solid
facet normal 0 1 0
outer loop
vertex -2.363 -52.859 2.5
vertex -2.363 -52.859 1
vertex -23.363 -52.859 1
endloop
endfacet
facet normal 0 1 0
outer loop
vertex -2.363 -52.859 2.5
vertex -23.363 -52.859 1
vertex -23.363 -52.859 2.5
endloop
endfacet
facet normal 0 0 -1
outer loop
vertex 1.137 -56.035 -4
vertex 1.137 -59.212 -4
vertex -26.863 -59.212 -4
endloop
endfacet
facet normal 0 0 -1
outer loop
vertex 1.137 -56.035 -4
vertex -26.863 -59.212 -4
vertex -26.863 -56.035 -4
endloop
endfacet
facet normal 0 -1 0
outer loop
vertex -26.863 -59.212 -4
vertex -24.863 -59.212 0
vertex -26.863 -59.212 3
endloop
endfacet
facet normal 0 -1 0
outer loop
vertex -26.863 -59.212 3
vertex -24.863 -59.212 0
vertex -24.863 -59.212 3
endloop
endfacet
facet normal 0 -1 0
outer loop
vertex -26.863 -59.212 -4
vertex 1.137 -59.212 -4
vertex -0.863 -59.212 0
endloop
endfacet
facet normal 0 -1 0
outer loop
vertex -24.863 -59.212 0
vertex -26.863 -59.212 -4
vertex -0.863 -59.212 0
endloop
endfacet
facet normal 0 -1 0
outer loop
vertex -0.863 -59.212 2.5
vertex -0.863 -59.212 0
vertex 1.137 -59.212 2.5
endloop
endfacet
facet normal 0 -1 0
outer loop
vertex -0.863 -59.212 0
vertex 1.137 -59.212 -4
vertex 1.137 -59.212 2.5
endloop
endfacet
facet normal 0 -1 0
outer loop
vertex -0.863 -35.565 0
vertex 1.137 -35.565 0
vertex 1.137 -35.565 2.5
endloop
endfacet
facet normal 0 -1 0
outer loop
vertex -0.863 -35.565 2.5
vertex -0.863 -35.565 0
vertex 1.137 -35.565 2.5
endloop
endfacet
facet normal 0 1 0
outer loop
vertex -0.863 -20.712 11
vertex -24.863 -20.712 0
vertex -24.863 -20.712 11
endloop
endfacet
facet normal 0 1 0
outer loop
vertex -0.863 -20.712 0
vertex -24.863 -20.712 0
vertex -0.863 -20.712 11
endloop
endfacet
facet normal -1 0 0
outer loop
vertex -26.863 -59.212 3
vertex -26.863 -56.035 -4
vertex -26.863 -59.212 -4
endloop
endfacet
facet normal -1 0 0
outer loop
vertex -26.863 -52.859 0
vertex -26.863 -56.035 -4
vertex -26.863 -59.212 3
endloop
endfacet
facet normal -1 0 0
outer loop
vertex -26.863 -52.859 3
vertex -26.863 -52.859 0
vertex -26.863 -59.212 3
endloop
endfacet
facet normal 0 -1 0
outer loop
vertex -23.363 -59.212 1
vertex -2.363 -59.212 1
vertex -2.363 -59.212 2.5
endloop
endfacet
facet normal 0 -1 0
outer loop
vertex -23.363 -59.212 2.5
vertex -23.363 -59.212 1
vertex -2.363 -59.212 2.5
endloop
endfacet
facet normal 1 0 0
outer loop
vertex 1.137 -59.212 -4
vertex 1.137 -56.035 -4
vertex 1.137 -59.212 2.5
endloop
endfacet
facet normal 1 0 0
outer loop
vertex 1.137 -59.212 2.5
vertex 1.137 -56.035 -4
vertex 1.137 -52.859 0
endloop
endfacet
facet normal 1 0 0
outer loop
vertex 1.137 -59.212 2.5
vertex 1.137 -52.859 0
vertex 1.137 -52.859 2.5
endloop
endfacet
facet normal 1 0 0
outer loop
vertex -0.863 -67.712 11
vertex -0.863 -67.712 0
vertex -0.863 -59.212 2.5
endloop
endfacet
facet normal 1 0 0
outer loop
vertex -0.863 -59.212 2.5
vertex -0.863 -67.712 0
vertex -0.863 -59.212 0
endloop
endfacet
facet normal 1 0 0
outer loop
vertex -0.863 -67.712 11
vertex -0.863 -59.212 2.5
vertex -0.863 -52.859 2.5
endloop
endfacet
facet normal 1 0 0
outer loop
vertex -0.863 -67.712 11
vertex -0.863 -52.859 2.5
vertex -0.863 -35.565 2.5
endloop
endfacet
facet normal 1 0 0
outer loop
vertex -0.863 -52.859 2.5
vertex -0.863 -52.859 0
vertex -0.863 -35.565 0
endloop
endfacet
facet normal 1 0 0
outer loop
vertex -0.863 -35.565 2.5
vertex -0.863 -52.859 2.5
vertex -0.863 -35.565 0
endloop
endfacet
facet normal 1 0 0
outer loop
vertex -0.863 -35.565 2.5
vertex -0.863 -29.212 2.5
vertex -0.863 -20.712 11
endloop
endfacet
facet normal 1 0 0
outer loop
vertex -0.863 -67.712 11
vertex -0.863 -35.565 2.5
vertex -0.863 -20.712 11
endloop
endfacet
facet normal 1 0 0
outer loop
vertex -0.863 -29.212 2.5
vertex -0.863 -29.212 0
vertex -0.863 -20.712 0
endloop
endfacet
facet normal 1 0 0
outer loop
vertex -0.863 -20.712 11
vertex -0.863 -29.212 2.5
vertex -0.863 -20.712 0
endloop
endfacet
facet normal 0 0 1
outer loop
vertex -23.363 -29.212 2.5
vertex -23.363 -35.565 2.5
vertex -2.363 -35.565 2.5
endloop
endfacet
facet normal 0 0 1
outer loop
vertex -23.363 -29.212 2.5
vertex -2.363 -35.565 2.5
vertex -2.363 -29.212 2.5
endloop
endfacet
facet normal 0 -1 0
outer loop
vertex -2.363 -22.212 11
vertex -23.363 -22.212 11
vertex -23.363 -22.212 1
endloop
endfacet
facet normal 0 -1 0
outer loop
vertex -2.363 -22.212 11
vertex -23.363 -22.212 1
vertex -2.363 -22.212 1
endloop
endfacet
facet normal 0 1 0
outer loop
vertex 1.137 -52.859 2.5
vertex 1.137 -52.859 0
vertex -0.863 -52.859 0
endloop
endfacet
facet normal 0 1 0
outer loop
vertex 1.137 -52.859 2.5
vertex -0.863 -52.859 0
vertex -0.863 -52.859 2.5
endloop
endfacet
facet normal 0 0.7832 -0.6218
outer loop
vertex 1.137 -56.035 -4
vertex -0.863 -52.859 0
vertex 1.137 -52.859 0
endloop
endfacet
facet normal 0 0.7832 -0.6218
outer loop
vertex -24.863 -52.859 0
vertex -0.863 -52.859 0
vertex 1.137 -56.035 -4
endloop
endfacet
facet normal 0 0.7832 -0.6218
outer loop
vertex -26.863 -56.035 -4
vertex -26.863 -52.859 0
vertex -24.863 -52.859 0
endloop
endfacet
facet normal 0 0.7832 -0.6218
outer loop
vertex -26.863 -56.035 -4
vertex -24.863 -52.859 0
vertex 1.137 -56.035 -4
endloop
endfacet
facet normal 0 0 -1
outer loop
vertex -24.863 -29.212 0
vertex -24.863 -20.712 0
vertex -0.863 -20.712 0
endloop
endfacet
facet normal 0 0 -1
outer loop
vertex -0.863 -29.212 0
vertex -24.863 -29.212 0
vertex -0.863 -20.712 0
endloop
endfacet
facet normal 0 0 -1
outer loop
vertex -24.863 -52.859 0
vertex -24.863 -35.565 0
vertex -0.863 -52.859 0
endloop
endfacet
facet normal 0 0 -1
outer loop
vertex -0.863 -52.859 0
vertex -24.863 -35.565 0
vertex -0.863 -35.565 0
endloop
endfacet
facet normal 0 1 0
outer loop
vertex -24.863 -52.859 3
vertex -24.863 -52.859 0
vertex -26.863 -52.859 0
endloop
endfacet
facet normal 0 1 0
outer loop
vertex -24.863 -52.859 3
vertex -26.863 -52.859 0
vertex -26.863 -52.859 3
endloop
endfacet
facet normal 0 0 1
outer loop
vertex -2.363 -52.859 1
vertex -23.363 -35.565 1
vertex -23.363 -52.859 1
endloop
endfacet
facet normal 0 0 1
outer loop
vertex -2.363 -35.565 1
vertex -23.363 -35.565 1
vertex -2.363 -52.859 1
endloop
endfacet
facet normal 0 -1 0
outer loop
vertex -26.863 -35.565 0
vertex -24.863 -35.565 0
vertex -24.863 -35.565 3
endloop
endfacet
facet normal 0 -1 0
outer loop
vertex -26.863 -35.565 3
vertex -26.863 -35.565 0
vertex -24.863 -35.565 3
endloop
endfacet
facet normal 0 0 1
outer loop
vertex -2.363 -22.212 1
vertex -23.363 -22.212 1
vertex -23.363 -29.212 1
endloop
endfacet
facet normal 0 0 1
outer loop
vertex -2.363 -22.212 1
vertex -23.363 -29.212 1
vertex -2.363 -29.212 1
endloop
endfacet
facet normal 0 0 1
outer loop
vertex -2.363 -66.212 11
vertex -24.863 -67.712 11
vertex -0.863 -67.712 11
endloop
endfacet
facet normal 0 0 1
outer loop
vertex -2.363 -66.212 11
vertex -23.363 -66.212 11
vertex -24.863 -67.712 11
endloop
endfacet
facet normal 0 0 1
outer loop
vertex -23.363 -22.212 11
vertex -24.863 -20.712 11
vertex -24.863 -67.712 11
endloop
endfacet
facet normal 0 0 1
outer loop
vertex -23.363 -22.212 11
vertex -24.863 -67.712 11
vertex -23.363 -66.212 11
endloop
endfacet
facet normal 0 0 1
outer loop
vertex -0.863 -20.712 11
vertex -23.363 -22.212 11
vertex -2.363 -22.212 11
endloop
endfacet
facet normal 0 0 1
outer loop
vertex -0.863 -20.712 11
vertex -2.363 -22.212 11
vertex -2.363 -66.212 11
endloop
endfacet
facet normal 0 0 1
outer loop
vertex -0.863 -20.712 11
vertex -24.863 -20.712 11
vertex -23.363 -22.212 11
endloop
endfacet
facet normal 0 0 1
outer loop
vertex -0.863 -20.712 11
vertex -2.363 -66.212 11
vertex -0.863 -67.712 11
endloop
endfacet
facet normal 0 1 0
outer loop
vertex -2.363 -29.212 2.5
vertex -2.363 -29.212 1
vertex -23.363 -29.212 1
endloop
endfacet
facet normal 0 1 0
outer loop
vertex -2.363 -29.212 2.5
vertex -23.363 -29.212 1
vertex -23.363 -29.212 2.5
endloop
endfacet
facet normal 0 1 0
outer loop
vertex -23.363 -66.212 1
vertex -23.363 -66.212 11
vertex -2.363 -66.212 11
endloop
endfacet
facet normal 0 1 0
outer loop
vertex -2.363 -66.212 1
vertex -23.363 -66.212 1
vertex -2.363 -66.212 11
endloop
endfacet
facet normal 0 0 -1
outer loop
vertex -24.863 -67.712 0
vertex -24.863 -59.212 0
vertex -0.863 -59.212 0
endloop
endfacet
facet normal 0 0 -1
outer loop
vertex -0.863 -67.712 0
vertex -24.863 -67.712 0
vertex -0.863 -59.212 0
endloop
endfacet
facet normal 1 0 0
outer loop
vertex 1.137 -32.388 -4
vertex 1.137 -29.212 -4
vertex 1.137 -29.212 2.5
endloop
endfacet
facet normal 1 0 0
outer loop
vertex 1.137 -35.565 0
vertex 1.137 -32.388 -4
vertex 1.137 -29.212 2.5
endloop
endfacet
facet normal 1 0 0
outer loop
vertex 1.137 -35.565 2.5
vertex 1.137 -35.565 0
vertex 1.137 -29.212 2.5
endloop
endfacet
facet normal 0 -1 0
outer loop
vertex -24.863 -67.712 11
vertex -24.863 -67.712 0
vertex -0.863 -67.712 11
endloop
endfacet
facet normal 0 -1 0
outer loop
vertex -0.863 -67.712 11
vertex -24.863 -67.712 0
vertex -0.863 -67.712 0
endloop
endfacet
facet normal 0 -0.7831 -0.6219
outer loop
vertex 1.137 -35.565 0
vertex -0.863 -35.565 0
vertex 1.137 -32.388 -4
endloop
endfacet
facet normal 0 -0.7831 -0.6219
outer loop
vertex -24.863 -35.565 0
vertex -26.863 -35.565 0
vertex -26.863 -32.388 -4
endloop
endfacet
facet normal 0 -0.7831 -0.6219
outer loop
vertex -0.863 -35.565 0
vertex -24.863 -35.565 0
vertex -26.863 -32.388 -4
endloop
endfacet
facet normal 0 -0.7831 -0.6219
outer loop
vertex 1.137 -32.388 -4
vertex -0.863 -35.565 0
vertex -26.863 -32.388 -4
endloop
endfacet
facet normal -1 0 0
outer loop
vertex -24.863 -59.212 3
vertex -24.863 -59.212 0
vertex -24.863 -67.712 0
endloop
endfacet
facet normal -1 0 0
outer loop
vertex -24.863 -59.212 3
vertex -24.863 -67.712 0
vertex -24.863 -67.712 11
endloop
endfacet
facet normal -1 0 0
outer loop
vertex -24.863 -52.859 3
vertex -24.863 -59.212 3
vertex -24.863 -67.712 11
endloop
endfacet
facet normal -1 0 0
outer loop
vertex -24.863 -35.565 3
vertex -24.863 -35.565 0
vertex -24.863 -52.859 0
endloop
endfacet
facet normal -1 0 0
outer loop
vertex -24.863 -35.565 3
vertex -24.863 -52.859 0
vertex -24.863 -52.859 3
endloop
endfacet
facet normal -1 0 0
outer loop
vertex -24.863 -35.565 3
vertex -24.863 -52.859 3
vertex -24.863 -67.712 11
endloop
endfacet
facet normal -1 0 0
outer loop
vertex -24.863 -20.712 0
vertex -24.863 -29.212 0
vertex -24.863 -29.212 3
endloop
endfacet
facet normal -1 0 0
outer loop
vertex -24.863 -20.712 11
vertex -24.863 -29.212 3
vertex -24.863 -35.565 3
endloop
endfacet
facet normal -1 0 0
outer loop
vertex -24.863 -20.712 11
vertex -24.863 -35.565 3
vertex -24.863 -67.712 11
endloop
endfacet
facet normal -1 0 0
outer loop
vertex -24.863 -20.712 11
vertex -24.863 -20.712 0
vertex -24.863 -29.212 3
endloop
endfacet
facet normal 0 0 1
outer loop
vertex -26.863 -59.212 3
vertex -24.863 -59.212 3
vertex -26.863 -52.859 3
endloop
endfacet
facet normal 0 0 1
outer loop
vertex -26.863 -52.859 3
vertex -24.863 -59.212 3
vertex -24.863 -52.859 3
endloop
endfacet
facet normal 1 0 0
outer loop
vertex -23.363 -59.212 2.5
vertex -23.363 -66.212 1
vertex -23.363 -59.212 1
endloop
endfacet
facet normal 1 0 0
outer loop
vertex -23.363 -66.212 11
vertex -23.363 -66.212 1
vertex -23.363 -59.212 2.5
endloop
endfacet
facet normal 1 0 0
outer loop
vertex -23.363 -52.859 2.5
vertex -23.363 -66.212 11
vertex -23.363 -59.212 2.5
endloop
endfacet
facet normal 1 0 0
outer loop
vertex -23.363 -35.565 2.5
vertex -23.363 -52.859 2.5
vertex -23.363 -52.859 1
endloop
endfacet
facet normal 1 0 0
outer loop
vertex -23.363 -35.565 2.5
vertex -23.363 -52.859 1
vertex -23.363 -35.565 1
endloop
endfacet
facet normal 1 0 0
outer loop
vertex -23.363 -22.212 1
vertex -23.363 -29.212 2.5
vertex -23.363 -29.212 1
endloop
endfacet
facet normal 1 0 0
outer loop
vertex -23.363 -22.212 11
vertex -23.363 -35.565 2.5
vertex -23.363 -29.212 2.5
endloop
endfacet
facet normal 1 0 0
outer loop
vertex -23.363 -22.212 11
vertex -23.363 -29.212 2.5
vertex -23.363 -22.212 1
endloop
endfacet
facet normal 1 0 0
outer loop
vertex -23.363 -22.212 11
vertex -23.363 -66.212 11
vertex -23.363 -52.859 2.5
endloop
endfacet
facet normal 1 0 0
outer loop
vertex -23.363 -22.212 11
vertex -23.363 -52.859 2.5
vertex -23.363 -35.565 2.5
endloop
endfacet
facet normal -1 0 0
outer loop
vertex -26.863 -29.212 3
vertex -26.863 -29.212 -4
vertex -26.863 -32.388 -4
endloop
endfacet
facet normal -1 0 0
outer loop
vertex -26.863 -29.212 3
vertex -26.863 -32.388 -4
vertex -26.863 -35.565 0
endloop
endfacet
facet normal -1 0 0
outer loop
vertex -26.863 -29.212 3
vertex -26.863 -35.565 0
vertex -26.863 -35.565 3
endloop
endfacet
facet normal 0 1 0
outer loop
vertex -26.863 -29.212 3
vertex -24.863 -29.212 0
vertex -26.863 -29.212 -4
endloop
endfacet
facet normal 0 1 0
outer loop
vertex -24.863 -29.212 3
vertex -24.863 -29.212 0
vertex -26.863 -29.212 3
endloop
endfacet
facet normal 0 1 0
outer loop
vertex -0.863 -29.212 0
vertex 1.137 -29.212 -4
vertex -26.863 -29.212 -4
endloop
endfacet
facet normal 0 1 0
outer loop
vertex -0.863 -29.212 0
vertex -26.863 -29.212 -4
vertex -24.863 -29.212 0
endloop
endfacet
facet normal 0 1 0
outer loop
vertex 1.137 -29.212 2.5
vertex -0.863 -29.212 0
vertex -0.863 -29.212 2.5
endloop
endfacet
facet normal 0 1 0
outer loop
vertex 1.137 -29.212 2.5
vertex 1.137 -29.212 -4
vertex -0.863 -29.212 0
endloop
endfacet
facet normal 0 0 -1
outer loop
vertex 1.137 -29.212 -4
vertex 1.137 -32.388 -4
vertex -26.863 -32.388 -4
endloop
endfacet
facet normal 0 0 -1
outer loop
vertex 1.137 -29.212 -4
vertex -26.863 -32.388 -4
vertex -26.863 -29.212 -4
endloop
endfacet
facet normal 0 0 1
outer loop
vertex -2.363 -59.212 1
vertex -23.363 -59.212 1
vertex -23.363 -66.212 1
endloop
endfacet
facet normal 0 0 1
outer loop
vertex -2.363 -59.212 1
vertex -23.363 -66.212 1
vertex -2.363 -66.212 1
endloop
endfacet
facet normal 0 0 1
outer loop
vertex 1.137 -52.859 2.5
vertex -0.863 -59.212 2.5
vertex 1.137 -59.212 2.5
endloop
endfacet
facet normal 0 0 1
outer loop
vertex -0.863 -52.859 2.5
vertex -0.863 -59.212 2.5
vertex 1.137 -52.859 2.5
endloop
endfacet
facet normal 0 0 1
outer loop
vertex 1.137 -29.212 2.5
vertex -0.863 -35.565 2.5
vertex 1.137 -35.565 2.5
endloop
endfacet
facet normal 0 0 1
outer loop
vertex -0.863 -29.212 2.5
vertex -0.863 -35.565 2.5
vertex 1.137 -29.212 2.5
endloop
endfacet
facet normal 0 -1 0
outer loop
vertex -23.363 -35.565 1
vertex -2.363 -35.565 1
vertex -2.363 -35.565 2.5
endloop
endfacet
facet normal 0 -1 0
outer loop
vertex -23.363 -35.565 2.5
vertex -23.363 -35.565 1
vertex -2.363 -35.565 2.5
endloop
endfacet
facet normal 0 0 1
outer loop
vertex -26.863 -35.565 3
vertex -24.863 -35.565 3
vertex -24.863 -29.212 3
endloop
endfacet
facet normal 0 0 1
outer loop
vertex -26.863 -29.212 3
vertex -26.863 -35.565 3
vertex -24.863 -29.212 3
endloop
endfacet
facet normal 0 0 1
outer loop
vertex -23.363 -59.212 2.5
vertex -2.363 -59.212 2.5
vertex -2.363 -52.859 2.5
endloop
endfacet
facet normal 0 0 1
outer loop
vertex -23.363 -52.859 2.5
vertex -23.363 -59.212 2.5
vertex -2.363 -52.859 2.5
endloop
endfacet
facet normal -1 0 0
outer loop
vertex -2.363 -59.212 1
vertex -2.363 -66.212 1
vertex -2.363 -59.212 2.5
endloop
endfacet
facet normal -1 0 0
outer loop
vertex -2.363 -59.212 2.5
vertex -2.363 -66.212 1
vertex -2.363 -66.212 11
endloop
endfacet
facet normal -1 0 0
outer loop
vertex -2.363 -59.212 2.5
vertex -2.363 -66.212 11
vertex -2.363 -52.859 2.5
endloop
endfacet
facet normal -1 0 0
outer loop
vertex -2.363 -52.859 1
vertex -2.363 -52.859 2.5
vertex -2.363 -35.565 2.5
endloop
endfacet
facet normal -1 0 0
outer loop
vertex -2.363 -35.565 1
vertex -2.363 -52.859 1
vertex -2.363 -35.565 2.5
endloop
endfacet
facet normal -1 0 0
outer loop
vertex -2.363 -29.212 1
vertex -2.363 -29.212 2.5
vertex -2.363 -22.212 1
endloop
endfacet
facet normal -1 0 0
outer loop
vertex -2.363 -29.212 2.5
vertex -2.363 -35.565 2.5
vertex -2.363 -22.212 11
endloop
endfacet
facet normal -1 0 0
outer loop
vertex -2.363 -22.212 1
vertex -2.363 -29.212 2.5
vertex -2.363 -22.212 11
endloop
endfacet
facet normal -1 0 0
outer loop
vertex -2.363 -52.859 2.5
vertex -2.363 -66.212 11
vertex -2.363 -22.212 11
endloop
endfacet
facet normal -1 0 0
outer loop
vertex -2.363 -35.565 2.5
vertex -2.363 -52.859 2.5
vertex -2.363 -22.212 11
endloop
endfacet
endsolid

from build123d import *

# Parameters (mm, degrees)
SKETCH_1_W          = 24
SKETCH_1_H          = 47
EXTRUDE_1_DEPTH     = 11
SKETCH_2_W          = 21
SKETCH_2_H          = 44
CUT_EXTRUDE_1_DEPTH = 10
SKETCH_3_W          = 6.5
SKETCH_3_H          = 6.352849337
EXTRUDE_2_DEPTH     = 26
SKETCH_4_W          = 7
SKETCH_4_H          = 6.352849337
EXTRUDE_3_DEPTH     = 2
CUT_EXTRUDE_2_DEPTH = 35


with BuildPart() as part:
    # 草图1 → 凸台-拉伸1 (new body)
    with BuildSketch(Plane.XY):
        with Locations((-12.862884841, -44.211686375)):
            Rectangle(SKETCH_1_W, SKETCH_1_H)
    extrude(amount=EXTRUDE_1_DEPTH)

    # 草图2 → 切除-拉伸1 (cut)
    with BuildSketch(Plane.XY.offset(11)):
        with Locations((-12.862884841, -44.211686375)):
            Rectangle(SKETCH_2_W, SKETCH_2_H)
    extrude(amount=-CUT_EXTRUDE_1_DEPTH, mode=Mode.SUBTRACT)

    # 草图3 → 凸台-拉伸2 (add)
    with BuildSketch(Plane.ZY.offset(24.862884841)):
        with Locations((-0.75, -32.388111044)):
            Rectangle(SKETCH_3_W, SKETCH_3_H)
        with Locations((-0.75, -56.035261707)):
            Rectangle(SKETCH_3_W, SKETCH_3_H)
    extrude(amount=-EXTRUDE_2_DEPTH)

    # 草图4 → 凸台-拉伸3 (add)
    with BuildSketch(Plane.ZY.offset(24.862884841)):
        with Locations((-0.5, -32.388111044)):
            Rectangle(SKETCH_4_W, SKETCH_4_H)
        with Locations((-0.5, -56.035261707)):
            Rectangle(SKETCH_4_W, SKETCH_4_H)
    extrude(amount=EXTRUDE_3_DEPTH)

    # 草图6 → 切除-拉伸2 (cut)
    with BuildSketch(Plane.ZY.offset(26.862884841)):
        Polygon((0, -35.564535712), (-4, -32.388111043), (-4, -35.564535712), align=None)
        Polygon((0, -52.858837038), (-4, -56.035261706), (-4, -52.858837038), align=None)
    extrude(amount=-CUT_EXTRUDE_2_DEPTH, mode=Mode.SUBTRACT)


solid = part.part
